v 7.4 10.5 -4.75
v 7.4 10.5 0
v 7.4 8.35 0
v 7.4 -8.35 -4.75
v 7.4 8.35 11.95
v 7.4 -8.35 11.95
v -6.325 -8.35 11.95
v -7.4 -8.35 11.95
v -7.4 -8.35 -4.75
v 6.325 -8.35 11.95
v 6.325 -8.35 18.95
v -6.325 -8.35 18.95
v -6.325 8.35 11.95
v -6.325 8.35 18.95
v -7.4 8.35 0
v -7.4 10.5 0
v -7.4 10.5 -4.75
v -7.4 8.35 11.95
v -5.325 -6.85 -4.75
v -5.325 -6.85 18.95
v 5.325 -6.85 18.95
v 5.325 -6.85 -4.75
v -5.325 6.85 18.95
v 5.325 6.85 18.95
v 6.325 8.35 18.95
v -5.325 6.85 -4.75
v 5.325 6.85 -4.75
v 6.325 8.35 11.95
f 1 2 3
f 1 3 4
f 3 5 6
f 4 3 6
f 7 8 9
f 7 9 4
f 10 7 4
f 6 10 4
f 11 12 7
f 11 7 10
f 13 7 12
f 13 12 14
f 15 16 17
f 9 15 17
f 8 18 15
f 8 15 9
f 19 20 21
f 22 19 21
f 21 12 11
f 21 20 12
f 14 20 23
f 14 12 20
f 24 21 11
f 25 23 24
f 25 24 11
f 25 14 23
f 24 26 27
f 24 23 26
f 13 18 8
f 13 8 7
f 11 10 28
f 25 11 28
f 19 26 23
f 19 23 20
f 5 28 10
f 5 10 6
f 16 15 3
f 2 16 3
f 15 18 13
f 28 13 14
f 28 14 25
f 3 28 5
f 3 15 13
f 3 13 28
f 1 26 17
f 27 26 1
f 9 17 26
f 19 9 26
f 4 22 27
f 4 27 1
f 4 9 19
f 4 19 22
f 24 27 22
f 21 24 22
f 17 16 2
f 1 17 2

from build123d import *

# Parameters (mm, degrees)
F0_W      = 14.8
F0_H      = 16.7
F0_W_2    = 11.8
F0_H_2    = 13.7
F1_DEPTH  = 11.95
F2_W      = 12.65
F2_H      = 16.7
F2_W_2    = 10.65
F2_H_2    = 14.7
F3_DEPTH  = 7
F4_W      = 0.575
F4_H      = 13.7
F5_DEPTH  = 11.95
F6_W      = 0.575
F6_H      = 13.7
F7_DEPTH  = 11.95
F8_W      = 10.65
F8_H      = 0.5
F9_DEPTH  = 7
F10_W     = 10.65
F10_H     = 0.5
F11_DEPTH = 7
F12_W     = 14.8
F12_H     = 18.85
F12_W_2   = 10.65
F12_H_2   = 13.7
F13_DEPTH = 4.75


with BuildPart() as f1:
    # F0 (on Top) → F1 (new body)
    with BuildSketch(Plane.XY):
        Rectangle(F0_W, F0_H)
        Rectangle(F0_W_2, F0_H_2, mode=Mode.SUBTRACT)
    extrude(amount=F1_DEPTH)

    # F2 (on face) → F3 (join)
    with BuildSketch(Plane.XY.offset(11.95)):
        Rectangle(F2_W, F2_H)
        Rectangle(F2_W_2, F2_H_2, mode=Mode.SUBTRACT)
    extrude(amount=F3_DEPTH)

    # F4 (on face) → F5 (join, through all)
    with BuildSketch(Plane(origin=(0, 0, 11.95), x_dir=(1, 0, 0), z_dir=(0, 0, -1))):
        with Locations((-5.6125, 0)):
            Rectangle(F4_W, F4_H)
    extrude(amount=F5_DEPTH)

    # F6 (on face) → F7 (join, through all)
    with BuildSketch(Plane(origin=(0, 0, 11.95), x_dir=(1, 0, 0), z_dir=(0, 0, -1))):
        with Locations((5.6125, 0)):
            Rectangle(F6_W, F6_H)
    extrude(amount=F7_DEPTH)

    # F8 (on face) → F9 (join, through all)
    with BuildSketch(Plane.XY.offset(11.95)):
        with Locations((0, 7.1)):
            Rectangle(F8_W, F8_H)
    extrude(amount=F9_DEPTH)

    # F10 (on face) → F11 (join, through all)
    with BuildSketch(Plane.XY.offset(11.95)):
        with Locations((0, -7.1)):
            Rectangle(F10_W, F10_H)
    extrude(amount=F11_DEPTH)

    # F12 (on face) → F13 (join)
    with BuildSketch(Plane(origin=(0, 0, 0), x_dir=(1, 0, 0), z_dir=(0, 0, -1))):
        with Locations((0, -1.075)):
            Rectangle(F12_W, F12_H)
        Rectangle(F12_W_2, F12_H_2, mode=Mode.SUBTRACT)
    extrude(amount=F13_DEPTH)


solid = f1.part
